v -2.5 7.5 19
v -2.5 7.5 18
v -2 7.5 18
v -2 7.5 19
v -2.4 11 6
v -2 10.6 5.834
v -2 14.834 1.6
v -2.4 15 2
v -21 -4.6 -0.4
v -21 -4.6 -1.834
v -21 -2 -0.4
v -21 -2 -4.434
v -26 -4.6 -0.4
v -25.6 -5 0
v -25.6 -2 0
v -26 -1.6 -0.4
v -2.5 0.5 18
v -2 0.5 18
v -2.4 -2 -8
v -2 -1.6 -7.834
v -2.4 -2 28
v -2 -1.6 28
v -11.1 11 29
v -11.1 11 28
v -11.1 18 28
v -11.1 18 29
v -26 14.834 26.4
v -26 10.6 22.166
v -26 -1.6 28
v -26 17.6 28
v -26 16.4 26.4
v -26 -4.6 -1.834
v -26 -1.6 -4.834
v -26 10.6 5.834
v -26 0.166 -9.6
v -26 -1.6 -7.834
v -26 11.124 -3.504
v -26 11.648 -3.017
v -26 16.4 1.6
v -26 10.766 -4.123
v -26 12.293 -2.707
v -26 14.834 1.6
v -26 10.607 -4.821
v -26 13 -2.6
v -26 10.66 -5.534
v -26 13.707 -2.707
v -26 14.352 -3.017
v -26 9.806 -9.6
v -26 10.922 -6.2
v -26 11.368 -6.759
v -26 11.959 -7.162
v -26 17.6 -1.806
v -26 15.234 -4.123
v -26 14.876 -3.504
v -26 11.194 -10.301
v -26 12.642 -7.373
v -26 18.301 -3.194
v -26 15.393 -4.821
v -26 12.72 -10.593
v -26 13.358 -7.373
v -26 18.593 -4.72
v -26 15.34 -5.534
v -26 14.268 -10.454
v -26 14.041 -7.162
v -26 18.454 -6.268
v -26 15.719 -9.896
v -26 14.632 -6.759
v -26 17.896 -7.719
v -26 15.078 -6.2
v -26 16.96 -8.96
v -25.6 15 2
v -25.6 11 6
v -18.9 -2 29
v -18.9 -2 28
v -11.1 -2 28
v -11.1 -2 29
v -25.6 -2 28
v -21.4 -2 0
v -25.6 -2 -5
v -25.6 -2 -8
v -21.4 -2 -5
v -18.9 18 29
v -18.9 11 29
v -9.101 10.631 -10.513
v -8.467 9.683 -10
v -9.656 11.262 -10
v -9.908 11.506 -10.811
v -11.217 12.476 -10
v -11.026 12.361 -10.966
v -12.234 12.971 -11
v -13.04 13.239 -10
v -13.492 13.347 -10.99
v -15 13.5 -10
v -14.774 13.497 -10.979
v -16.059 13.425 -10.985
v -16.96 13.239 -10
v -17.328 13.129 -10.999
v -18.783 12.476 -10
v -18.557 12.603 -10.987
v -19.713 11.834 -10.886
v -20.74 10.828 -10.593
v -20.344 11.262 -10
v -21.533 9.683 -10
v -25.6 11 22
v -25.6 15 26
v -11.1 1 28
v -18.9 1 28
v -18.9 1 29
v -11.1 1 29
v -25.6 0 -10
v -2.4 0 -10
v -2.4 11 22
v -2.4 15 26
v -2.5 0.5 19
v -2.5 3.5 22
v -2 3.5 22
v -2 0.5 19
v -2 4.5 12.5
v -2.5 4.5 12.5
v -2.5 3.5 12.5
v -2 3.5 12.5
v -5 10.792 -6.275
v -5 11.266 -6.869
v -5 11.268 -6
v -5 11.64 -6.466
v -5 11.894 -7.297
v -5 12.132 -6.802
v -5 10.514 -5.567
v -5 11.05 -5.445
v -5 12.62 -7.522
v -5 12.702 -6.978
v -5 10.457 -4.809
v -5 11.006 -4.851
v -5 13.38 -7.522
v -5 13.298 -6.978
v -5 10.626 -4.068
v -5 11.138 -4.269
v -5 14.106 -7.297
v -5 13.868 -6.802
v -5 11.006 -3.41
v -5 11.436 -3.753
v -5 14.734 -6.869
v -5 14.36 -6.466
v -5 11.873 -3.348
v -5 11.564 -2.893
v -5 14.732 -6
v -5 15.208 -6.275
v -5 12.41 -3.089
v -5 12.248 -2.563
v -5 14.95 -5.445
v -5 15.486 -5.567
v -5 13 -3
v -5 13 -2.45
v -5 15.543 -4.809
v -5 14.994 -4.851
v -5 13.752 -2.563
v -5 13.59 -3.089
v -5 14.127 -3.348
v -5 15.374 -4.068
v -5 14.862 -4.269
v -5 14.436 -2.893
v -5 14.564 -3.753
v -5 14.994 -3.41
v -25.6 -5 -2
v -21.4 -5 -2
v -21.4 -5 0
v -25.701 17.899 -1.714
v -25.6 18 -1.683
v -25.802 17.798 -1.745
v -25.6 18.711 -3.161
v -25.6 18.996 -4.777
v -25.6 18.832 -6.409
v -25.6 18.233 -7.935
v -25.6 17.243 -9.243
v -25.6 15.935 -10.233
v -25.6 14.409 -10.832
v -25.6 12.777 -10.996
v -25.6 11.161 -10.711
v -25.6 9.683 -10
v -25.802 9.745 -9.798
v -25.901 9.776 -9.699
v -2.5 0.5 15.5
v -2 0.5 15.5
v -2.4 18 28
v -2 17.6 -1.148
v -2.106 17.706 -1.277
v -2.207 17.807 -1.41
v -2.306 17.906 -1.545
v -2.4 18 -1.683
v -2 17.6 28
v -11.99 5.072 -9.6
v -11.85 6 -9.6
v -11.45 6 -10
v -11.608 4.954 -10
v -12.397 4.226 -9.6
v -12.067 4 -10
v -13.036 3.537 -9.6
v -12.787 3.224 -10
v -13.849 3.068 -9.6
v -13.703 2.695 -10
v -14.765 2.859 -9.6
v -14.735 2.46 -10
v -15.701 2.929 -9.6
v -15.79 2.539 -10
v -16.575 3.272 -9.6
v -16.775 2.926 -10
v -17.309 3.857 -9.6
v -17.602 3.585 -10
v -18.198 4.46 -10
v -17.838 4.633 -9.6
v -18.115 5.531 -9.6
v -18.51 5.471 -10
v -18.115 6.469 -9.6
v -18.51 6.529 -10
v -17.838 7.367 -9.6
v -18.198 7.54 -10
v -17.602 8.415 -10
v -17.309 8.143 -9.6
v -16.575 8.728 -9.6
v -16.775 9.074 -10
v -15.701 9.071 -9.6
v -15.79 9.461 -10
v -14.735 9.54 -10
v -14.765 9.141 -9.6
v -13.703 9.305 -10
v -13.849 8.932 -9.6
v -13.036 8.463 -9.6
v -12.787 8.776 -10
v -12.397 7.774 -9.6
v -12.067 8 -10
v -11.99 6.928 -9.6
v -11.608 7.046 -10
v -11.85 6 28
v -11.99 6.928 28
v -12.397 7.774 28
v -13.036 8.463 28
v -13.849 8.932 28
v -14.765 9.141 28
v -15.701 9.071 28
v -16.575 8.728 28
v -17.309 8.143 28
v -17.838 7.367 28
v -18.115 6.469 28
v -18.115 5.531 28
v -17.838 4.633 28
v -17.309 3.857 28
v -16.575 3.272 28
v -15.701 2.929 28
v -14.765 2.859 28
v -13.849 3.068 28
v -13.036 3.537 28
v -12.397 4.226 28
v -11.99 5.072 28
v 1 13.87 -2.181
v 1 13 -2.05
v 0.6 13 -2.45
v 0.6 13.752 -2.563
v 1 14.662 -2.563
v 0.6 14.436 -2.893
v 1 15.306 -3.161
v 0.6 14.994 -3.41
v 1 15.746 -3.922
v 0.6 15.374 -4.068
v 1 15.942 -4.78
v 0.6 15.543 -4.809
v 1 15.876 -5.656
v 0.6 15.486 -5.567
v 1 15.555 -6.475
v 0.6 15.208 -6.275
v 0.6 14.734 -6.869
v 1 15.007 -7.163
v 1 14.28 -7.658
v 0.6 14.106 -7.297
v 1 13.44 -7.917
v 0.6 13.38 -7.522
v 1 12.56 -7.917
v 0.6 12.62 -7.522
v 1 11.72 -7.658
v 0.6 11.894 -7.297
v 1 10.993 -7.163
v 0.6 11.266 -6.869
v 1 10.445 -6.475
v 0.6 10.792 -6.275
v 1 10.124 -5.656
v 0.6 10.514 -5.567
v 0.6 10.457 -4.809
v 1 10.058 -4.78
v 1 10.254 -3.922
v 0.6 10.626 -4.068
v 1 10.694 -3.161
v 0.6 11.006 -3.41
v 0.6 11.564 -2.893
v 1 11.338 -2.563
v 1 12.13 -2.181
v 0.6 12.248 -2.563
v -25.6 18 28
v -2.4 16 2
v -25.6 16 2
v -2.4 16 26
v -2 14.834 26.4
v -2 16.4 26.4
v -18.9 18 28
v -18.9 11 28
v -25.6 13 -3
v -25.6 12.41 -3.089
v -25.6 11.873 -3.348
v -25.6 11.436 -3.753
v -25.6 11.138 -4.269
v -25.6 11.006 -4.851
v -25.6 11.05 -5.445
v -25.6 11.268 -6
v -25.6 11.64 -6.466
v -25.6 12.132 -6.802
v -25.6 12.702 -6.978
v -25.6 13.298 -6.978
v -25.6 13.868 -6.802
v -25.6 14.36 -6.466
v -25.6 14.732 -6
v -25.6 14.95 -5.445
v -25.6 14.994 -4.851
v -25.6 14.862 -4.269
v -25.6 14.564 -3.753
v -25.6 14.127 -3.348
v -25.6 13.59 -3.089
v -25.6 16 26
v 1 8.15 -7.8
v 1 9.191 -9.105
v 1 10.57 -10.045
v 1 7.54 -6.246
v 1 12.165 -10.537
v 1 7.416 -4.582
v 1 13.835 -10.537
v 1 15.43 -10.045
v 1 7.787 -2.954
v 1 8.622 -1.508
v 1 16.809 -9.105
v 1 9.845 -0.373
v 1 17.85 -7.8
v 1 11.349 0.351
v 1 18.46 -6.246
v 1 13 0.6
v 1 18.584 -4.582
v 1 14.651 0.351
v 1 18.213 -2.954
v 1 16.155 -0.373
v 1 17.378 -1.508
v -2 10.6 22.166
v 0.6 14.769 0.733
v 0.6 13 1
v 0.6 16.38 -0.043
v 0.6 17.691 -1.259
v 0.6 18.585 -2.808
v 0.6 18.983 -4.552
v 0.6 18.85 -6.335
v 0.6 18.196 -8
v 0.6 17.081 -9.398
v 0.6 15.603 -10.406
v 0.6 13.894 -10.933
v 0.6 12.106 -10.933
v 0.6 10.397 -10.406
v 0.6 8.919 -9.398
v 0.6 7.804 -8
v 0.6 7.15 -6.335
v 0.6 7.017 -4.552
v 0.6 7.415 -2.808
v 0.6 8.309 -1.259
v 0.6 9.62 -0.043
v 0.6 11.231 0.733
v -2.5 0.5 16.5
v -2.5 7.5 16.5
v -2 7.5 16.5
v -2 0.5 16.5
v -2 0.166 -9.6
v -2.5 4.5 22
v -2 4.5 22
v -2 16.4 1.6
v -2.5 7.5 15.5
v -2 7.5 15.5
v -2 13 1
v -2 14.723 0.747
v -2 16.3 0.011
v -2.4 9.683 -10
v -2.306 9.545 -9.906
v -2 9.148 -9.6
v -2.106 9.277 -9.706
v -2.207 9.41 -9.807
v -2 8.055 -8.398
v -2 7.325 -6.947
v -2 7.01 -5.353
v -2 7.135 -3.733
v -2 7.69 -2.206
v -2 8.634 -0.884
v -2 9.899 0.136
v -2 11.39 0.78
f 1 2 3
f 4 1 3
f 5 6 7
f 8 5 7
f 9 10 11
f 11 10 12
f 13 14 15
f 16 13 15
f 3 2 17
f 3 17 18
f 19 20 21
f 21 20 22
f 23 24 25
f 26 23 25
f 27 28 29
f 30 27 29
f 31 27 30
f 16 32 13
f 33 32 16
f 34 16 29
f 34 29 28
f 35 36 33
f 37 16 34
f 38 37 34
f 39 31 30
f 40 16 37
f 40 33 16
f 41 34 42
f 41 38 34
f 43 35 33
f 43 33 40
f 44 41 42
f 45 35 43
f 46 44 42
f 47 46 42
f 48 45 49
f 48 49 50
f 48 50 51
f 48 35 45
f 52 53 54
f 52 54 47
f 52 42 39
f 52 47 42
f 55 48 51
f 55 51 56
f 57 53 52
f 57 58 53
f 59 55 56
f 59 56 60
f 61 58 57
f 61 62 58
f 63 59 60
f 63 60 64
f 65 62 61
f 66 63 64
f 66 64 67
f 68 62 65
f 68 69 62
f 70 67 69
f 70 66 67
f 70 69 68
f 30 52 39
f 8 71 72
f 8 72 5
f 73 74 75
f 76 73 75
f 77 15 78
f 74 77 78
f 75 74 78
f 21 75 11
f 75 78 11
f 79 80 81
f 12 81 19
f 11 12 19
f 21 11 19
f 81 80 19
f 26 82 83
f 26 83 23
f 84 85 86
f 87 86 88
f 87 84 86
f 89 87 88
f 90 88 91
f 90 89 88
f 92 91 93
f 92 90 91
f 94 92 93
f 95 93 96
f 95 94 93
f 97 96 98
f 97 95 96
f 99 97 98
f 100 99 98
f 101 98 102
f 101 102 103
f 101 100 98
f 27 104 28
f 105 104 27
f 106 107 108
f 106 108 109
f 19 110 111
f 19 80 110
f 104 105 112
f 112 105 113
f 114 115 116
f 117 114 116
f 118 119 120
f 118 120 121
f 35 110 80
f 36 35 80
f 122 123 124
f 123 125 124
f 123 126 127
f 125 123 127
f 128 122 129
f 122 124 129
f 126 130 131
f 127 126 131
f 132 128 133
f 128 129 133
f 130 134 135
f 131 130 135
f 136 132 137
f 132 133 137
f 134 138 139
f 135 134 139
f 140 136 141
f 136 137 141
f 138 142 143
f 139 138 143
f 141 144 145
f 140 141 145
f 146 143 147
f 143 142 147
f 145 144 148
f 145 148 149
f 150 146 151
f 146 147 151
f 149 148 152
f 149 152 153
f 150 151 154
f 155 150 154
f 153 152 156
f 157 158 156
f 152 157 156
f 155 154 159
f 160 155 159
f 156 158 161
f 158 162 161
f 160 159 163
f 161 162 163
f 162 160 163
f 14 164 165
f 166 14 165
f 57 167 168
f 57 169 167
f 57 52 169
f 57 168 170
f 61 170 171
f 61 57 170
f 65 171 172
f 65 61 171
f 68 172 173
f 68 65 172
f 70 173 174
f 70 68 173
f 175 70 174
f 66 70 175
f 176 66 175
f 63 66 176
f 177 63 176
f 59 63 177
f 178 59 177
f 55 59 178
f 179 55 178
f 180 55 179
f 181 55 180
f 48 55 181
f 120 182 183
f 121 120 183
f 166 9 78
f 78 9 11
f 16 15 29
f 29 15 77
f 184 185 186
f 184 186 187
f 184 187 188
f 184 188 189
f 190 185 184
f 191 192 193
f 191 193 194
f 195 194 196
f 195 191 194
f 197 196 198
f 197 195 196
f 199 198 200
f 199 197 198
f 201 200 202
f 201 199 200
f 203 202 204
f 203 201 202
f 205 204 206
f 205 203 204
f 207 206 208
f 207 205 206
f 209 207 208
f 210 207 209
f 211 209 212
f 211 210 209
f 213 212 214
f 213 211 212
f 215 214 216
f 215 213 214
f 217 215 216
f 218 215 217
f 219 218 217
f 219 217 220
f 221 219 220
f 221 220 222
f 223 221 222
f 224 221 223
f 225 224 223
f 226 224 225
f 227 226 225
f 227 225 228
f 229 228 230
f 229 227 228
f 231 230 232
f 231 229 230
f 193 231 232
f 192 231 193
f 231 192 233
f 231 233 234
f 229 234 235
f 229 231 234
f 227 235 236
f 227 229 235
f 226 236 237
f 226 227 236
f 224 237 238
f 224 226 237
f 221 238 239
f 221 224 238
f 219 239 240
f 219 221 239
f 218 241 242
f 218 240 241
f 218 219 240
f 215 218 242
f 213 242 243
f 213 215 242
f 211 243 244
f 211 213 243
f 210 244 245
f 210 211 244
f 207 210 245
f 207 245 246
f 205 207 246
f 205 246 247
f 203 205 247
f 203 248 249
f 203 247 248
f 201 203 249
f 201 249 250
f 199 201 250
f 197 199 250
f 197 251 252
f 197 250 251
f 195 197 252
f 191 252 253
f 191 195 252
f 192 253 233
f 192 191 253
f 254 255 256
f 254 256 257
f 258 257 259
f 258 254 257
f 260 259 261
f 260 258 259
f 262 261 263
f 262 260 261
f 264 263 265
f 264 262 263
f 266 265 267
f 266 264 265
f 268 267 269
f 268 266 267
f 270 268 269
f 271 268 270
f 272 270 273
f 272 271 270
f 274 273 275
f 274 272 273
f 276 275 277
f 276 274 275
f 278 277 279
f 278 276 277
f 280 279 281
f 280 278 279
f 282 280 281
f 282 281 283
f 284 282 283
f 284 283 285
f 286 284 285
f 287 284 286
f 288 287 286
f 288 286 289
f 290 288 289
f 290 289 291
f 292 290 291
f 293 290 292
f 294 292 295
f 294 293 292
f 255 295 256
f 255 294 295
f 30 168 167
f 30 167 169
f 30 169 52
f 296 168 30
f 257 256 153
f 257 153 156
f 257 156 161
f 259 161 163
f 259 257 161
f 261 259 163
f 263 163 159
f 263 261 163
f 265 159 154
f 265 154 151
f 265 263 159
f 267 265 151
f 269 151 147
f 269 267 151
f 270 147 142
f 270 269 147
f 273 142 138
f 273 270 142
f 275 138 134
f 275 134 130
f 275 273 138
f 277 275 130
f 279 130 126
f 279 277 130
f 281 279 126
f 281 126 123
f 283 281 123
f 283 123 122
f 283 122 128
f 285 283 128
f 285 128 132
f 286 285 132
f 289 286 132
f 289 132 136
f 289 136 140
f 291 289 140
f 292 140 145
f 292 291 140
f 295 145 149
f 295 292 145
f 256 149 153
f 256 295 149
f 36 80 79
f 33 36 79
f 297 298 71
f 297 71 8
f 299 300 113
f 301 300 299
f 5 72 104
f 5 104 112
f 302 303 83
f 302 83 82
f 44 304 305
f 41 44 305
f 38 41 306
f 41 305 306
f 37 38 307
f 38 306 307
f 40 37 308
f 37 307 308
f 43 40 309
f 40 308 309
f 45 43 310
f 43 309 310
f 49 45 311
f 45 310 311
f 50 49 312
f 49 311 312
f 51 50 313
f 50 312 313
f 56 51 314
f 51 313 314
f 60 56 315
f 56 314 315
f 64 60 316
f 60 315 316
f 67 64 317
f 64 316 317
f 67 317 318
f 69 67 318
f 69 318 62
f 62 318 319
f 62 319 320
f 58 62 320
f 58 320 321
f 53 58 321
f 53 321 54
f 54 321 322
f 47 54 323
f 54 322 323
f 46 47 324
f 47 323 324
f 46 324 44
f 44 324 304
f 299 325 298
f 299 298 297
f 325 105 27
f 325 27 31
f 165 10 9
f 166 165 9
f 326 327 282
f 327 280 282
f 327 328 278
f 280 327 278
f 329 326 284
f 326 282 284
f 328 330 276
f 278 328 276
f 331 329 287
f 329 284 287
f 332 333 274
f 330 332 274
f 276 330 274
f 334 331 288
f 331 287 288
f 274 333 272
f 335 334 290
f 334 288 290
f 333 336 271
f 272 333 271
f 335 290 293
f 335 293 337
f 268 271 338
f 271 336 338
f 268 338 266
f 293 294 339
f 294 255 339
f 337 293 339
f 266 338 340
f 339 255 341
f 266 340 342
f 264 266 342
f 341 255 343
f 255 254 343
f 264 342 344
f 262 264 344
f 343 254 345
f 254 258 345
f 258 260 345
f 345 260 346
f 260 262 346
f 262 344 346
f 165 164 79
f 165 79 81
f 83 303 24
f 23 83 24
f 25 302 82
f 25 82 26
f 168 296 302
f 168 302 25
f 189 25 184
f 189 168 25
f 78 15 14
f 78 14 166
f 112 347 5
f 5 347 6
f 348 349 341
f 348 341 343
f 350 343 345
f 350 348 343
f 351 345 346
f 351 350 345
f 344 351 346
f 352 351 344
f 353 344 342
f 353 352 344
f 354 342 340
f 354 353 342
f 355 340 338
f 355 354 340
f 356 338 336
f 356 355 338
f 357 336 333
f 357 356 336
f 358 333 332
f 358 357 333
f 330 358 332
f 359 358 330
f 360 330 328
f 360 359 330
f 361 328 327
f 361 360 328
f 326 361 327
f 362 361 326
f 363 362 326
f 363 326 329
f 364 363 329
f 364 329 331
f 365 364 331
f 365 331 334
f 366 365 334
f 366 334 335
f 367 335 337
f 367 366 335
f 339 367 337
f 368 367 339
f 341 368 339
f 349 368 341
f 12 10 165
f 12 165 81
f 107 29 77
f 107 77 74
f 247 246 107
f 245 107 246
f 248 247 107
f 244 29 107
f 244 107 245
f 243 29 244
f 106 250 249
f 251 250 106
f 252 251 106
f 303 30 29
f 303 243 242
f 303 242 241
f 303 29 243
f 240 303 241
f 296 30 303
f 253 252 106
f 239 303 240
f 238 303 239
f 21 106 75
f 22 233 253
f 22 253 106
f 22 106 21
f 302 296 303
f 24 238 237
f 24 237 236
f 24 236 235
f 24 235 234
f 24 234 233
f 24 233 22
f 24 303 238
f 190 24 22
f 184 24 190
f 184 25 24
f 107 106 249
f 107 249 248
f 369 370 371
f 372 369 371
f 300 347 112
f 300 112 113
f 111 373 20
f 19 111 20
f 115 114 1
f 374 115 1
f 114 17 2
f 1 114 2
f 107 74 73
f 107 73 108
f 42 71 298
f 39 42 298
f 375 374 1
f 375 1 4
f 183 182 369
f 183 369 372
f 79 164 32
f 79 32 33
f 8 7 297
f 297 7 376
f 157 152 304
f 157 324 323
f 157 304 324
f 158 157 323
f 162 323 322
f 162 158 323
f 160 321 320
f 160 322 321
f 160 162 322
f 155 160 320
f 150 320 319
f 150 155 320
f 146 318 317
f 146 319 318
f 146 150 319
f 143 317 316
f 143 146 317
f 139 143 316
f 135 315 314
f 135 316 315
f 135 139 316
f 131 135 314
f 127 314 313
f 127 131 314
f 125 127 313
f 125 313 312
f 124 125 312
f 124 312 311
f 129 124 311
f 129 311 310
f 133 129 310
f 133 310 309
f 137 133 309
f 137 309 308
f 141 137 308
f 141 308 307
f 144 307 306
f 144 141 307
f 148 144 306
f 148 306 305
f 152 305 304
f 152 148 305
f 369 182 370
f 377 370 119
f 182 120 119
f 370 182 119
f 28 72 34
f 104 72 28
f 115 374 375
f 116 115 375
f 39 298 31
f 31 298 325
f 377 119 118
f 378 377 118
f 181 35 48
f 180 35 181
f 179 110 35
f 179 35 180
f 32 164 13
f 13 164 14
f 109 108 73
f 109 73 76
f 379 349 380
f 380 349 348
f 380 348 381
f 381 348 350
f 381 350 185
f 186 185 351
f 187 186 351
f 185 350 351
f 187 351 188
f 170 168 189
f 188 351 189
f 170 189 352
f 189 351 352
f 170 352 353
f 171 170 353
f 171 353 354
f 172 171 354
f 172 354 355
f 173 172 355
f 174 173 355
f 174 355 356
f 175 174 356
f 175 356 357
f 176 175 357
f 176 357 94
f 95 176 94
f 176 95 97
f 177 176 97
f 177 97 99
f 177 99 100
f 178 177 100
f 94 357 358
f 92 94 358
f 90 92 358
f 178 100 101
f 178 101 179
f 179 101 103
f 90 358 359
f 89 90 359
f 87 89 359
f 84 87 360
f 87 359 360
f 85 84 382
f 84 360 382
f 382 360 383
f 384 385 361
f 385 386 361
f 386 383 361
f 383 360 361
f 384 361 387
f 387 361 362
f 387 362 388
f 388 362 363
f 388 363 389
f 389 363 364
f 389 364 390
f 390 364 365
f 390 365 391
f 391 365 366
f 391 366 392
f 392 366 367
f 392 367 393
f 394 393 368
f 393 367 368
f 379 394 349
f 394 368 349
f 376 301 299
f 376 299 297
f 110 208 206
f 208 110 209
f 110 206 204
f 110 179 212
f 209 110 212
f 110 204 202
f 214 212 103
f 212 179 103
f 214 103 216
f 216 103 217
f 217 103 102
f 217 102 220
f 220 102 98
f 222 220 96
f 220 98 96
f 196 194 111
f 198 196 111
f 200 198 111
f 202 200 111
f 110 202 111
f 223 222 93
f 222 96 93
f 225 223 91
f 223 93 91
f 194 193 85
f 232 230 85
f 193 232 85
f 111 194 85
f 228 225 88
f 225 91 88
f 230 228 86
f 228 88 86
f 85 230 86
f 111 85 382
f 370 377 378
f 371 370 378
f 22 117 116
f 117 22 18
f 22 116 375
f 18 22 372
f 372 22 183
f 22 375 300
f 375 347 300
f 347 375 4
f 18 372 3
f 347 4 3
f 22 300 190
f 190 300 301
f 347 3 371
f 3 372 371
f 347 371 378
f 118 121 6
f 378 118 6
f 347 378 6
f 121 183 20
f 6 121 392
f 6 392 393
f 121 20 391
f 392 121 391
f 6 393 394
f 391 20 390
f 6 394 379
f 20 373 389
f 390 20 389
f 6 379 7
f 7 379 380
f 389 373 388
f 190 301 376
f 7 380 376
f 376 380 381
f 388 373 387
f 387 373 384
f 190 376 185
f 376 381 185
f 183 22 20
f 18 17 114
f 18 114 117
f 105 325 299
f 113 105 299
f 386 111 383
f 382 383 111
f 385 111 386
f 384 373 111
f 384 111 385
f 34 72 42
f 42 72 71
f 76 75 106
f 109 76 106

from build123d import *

# Parameters (mm, degrees)
CYLINDER024_R               = 7.5
CYLINDER024_DEPTH           = 2
CYLINDER012_R               = 3.15
CYLINDER012_DEPTH           = 43
CYLINDER011_R               = 2
CYLINDER011_DEPTH           = 39
CYLINDER013_R               = 2.55
CYLINDER013_DEPTH           = 6
BOX022_W                    = 1
BOX022_H                    = 7
BOX022_DEPTH                = 4
BOX023_W                    = 1
BOX023_H                    = 7
BOX023_DEPTH                = 4
CHAMFER003068012002016_SIZE = 3
BOX020_W                    = 7.8
BOX020_H                    = 3
BOX020_DEPTH                = 1
BOX018_W                    = 7.8
BOX018_H                    = 7
BOX018_DEPTH                = 1
BOX021_W                    = 5
BOX021_H                    = 4
BOX021_DEPTH                = 5
CHAMFER003068012002041_SIZE = 3
CHAMFER003068012002042_SIZE = 0.4
BOX017_W                    = 25
BOX017_H                    = 5
BOX017_DEPTH                = 24
CHAMFER003068012002002_SIZE = 4
BOX015_W                    = 24
BOX015_H                    = 20
BOX015_DEPTH                = 38
CHAMFER003068012002006_SIZE = 2
CHAMFER003068012002007_SIZE = 2
CHAMFER003068012002009_SIZE = 0.4
CYLINDER023_R               = 6
CYLINDER023_DEPTH           = 27
CHAMFER003068012002044_SIZE = 0.4
CHAMFER003068012002045_SIZE = 0.4


with BuildPart() as cylinder024:
    # Cylinder024 → Cylinder024 (new body)
    with BuildSketch(Plane(origin=(-15, 6, -12), x_dir=(1, 0, 0), z_dir=(0, 0, 1))):
        Circle(CYLINDER024_R)
    extrude(amount=CYLINDER024_DEPTH)


with BuildPart() as cylinder012:
    # Cylinder012 → Cylinder012 (new body)
    with BuildSketch(Plane(origin=(-15, 6, -11), x_dir=(1, 0, 0), z_dir=(0, 0, 1))):
        Circle(CYLINDER012_R)
    extrude(amount=CYLINDER012_DEPTH)


with BuildPart() as cylinder011:
    # Cylinder011 → Cylinder011 (new body)
    with BuildSketch(Plane(origin=(1, 13, -5), x_dir=(0, 0, 1), z_dir=(-1, 0, 0))):
        Circle(CYLINDER011_R)
    extrude(amount=CYLINDER011_DEPTH)


with BuildPart() as fusion001002012005:
    # Cylinder013 → Cylinder013 (new body)
    with BuildSketch(Plane(origin=(1, 13, -5), x_dir=(0, 0, 1), z_dir=(-1, 0, 0))):
        Circle(CYLINDER013_R)
    extrude(amount=CYLINDER013_DEPTH)

    # Fusion001002012005: union Cylinder011
    add(cylinder011.part)


with BuildPart() as cube022:
    # Box022 → Box022 (new body)
    with BuildSketch(Plane(origin=(-2.5, 0.5, 16.5), x_dir=(1, 0, 0), z_dir=(0, 0, 1))):
        with Locations((0.5, 3.5)):
            Rectangle(BOX022_W, BOX022_H)
    extrude(amount=BOX022_DEPTH)


with BuildPart() as chamfer003068012002016:
    # Box023 → Box023 (new body)
    with BuildSketch(Plane(origin=(-2.5, 0.5, 11), x_dir=(1, 0, 0), z_dir=(0, 0, 1))):
        with Locations((0.5, 3.5)):
            Rectangle(BOX023_W, BOX023_H)
    extrude(amount=BOX023_DEPTH)

    # Fusion001002012009: union Cube022
    add(cube022.part)

    # Chamfer003068012002016
    chamfer003068012002016_edges = [chamfer003068012002016.edges().sort_by_distance(p)[0] for p in [
        (-2, 0.5, 11),
        (-2, 7.5, 11),
        (-2, 0.5, 20.5),
        (-2, 7.5, 20.5),
    ]]
    chamfer(chamfer003068012002016_edges, length=CHAMFER003068012002016_SIZE)


with BuildPart() as chamfer003068012002016_1:
    # Chamfer003068012002016 placement: moved
    add(chamfer003068012002016.part.moved(Location((0, 0, 1.5))))


with BuildPart() as cube020:
    # Box020 → Box020 (new body)
    with BuildSketch(Plane(origin=(-18.9, -2, 28), x_dir=(1, 0, 0), z_dir=(0, 0, 1))):
        with Locations((3.9, 1.5)):
            Rectangle(BOX020_W, BOX020_H)
    extrude(amount=BOX020_DEPTH)


with BuildPart() as fusion001002012023:
    # Box018 → Box018 (new body)
    with BuildSketch(Plane(origin=(-18.9, 11, 28), x_dir=(1, 0, 0), z_dir=(0, 0, 1))):
        with Locations((3.9, 3.5)):
            Rectangle(BOX018_W, BOX018_H)
    extrude(amount=BOX018_DEPTH)

    # Fusion001002012023: union Cube020
    add(cube020.part)


with BuildPart() as chamfer003068012002042:
    # Box021 → Box021 (new body)
    with BuildSketch(Plane(origin=(-26, -5, -5), x_dir=(1, 0, 0), z_dir=(0, 0, 1))):
        with Locations((2.5, 2)):
            Rectangle(BOX021_W, BOX021_H)
    extrude(amount=BOX021_DEPTH)

    # Chamfer003068012002041
    chamfer003068012002041_edges = [chamfer003068012002042.edges().sort_by_distance(p)[0] for p in [
        (-23.5, -5, -5),
    ]]
    chamfer(chamfer003068012002041_edges, length=CHAMFER003068012002041_SIZE)

    # Chamfer003068012002042
    chamfer003068012002042_edges = [chamfer003068012002042.edges().sort_by_distance(p)[0] for p in [
        (-26, -5, -1),
        (-26, -3.5, -3.5),
        (-26, -3, 0),
        (-21, -5, -1),
        (-21, -3.5, -3.5),
        (-21, -3, 0),
    ]]
    chamfer(chamfer003068012002042_edges, length=CHAMFER003068012002042_SIZE)


with BuildPart() as chamfer003068012002002:
    # Box017 → Box017 (new body)
    with BuildSketch(Plane(origin=(-26, 11, 2), x_dir=(1, 0, 0), z_dir=(0, 0, 1))):
        with Locations((12.5, 2.5)):
            Rectangle(BOX017_W, BOX017_H)
    extrude(amount=BOX017_DEPTH)

    # Chamfer003068012002002
    chamfer003068012002002_edges = [chamfer003068012002002.edges().sort_by_distance(p)[0] for p in [
        (-13.5, 11, 2),
        (-13.5, 11, 26),
    ]]
    chamfer(chamfer003068012002002_edges, length=CHAMFER003068012002002_SIZE)


with BuildPart() as chamfer003068012002009:
    # Box015 → Box015 (new body)
    with BuildSketch(Plane(origin=(-26, -2, -10), x_dir=(1, 0, 0), z_dir=(0, 0, 1))):
        with Locations((12, 10)):
            Rectangle(BOX015_W, BOX015_H)
    extrude(amount=BOX015_DEPTH)

    # Cut001008: cut Chamfer003068012002002
    add(chamfer003068012002002.part, mode=Mode.SUBTRACT)

    # Chamfer003068012002006
    chamfer003068012002006_edges = [chamfer003068012002009.edges().sort_by_distance(p)[0] for p in [
        (-14, 18, -10),
    ]]
    chamfer(chamfer003068012002006_edges, length=CHAMFER003068012002006_SIZE)

    # Chamfer003068012002007
    chamfer003068012002007_edges = [chamfer003068012002009.edges().sort_by_distance(p)[0] for p in [
        (-14, -2, -10),
    ]]
    chamfer(chamfer003068012002007_edges, length=CHAMFER003068012002007_SIZE)

    # Chamfer003068012002009
    chamfer003068012002009_edges = [chamfer003068012002009.edges().sort_by_distance(p)[0] for p in [
        (-26, 8, -10),
        (-26, -1, -9),
        (-26, 17, -9),
        (-26, -2, 10),
        (-26, 18, 10),
        (-26, 13, 4),
        (-26, 15.5, 2),
        (-26, 16, 14),
        (-26, 15.5, 26),
        (-26, 13, 24),
        (-26, 11, 14),
        (-2, 8, -10),
        (-2, -1, -9),
        (-2, 17, -9),
        (-2, -2, 10),
        (-2, 18, 10),
        (-2, 13, 4),
        (-2, 15.5, 2),
        (-2, 16, 14),
        (-2, 15.5, 26),
        (-2, 13, 24),
        (-2, 11, 14),
    ]]
    chamfer(chamfer003068012002009_edges, length=CHAMFER003068012002009_SIZE)


with BuildPart() as universal_pulley_mount:
    # Cylinder023 → Cylinder023 (new body)
    with BuildSketch(Plane(origin=(1, 13, -5), x_dir=(0, 0, 1), z_dir=(-1, 0, 0))):
        Circle(CYLINDER023_R)
    extrude(amount=CYLINDER023_DEPTH)

    # Chamfer003068012002044
    chamfer003068012002044_edges = [universal_pulley_mount.edges().sort_by_distance(p)[0] for p in [
        (-26, 13, -11),
    ]]
    chamfer(chamfer003068012002044_edges, length=CHAMFER003068012002044_SIZE)

    # Fusion001002012022: union Chamfer003068012002009
    add(chamfer003068012002009.part)

    # Fusion001002012024: union Fusion001002012023, Chamfer003068012002042
    add(fusion001002012023.part)
    add(chamfer003068012002042.part)

    # Cut001023: cut Chamfer003068012002016
    add(chamfer003068012002016_1.part, mode=Mode.SUBTRACT)

    # Cut001024: cut Fusion001002012005
    add(fusion001002012005.part, mode=Mode.SUBTRACT)

    # Cut001025: cut Cylinder012
    add(cylinder012.part, mode=Mode.SUBTRACT)

    # Cut001026: cut Cylinder024
    add(cylinder024.part, mode=Mode.SUBTRACT)

    # Chamfer003068012002045
    chamfer003068012002045_edges = [universal_pulley_mount.edges().sort_by_distance(p)[0] for p in [
        (1, 13, -11),
        (1, 13, -7.55),
        (-18.15, 6, -10),
        (-26, 13, -7),
    ]]
    chamfer(chamfer003068012002045_edges, length=CHAMFER003068012002045_SIZE)


solid = universal_pulley_mount.part
